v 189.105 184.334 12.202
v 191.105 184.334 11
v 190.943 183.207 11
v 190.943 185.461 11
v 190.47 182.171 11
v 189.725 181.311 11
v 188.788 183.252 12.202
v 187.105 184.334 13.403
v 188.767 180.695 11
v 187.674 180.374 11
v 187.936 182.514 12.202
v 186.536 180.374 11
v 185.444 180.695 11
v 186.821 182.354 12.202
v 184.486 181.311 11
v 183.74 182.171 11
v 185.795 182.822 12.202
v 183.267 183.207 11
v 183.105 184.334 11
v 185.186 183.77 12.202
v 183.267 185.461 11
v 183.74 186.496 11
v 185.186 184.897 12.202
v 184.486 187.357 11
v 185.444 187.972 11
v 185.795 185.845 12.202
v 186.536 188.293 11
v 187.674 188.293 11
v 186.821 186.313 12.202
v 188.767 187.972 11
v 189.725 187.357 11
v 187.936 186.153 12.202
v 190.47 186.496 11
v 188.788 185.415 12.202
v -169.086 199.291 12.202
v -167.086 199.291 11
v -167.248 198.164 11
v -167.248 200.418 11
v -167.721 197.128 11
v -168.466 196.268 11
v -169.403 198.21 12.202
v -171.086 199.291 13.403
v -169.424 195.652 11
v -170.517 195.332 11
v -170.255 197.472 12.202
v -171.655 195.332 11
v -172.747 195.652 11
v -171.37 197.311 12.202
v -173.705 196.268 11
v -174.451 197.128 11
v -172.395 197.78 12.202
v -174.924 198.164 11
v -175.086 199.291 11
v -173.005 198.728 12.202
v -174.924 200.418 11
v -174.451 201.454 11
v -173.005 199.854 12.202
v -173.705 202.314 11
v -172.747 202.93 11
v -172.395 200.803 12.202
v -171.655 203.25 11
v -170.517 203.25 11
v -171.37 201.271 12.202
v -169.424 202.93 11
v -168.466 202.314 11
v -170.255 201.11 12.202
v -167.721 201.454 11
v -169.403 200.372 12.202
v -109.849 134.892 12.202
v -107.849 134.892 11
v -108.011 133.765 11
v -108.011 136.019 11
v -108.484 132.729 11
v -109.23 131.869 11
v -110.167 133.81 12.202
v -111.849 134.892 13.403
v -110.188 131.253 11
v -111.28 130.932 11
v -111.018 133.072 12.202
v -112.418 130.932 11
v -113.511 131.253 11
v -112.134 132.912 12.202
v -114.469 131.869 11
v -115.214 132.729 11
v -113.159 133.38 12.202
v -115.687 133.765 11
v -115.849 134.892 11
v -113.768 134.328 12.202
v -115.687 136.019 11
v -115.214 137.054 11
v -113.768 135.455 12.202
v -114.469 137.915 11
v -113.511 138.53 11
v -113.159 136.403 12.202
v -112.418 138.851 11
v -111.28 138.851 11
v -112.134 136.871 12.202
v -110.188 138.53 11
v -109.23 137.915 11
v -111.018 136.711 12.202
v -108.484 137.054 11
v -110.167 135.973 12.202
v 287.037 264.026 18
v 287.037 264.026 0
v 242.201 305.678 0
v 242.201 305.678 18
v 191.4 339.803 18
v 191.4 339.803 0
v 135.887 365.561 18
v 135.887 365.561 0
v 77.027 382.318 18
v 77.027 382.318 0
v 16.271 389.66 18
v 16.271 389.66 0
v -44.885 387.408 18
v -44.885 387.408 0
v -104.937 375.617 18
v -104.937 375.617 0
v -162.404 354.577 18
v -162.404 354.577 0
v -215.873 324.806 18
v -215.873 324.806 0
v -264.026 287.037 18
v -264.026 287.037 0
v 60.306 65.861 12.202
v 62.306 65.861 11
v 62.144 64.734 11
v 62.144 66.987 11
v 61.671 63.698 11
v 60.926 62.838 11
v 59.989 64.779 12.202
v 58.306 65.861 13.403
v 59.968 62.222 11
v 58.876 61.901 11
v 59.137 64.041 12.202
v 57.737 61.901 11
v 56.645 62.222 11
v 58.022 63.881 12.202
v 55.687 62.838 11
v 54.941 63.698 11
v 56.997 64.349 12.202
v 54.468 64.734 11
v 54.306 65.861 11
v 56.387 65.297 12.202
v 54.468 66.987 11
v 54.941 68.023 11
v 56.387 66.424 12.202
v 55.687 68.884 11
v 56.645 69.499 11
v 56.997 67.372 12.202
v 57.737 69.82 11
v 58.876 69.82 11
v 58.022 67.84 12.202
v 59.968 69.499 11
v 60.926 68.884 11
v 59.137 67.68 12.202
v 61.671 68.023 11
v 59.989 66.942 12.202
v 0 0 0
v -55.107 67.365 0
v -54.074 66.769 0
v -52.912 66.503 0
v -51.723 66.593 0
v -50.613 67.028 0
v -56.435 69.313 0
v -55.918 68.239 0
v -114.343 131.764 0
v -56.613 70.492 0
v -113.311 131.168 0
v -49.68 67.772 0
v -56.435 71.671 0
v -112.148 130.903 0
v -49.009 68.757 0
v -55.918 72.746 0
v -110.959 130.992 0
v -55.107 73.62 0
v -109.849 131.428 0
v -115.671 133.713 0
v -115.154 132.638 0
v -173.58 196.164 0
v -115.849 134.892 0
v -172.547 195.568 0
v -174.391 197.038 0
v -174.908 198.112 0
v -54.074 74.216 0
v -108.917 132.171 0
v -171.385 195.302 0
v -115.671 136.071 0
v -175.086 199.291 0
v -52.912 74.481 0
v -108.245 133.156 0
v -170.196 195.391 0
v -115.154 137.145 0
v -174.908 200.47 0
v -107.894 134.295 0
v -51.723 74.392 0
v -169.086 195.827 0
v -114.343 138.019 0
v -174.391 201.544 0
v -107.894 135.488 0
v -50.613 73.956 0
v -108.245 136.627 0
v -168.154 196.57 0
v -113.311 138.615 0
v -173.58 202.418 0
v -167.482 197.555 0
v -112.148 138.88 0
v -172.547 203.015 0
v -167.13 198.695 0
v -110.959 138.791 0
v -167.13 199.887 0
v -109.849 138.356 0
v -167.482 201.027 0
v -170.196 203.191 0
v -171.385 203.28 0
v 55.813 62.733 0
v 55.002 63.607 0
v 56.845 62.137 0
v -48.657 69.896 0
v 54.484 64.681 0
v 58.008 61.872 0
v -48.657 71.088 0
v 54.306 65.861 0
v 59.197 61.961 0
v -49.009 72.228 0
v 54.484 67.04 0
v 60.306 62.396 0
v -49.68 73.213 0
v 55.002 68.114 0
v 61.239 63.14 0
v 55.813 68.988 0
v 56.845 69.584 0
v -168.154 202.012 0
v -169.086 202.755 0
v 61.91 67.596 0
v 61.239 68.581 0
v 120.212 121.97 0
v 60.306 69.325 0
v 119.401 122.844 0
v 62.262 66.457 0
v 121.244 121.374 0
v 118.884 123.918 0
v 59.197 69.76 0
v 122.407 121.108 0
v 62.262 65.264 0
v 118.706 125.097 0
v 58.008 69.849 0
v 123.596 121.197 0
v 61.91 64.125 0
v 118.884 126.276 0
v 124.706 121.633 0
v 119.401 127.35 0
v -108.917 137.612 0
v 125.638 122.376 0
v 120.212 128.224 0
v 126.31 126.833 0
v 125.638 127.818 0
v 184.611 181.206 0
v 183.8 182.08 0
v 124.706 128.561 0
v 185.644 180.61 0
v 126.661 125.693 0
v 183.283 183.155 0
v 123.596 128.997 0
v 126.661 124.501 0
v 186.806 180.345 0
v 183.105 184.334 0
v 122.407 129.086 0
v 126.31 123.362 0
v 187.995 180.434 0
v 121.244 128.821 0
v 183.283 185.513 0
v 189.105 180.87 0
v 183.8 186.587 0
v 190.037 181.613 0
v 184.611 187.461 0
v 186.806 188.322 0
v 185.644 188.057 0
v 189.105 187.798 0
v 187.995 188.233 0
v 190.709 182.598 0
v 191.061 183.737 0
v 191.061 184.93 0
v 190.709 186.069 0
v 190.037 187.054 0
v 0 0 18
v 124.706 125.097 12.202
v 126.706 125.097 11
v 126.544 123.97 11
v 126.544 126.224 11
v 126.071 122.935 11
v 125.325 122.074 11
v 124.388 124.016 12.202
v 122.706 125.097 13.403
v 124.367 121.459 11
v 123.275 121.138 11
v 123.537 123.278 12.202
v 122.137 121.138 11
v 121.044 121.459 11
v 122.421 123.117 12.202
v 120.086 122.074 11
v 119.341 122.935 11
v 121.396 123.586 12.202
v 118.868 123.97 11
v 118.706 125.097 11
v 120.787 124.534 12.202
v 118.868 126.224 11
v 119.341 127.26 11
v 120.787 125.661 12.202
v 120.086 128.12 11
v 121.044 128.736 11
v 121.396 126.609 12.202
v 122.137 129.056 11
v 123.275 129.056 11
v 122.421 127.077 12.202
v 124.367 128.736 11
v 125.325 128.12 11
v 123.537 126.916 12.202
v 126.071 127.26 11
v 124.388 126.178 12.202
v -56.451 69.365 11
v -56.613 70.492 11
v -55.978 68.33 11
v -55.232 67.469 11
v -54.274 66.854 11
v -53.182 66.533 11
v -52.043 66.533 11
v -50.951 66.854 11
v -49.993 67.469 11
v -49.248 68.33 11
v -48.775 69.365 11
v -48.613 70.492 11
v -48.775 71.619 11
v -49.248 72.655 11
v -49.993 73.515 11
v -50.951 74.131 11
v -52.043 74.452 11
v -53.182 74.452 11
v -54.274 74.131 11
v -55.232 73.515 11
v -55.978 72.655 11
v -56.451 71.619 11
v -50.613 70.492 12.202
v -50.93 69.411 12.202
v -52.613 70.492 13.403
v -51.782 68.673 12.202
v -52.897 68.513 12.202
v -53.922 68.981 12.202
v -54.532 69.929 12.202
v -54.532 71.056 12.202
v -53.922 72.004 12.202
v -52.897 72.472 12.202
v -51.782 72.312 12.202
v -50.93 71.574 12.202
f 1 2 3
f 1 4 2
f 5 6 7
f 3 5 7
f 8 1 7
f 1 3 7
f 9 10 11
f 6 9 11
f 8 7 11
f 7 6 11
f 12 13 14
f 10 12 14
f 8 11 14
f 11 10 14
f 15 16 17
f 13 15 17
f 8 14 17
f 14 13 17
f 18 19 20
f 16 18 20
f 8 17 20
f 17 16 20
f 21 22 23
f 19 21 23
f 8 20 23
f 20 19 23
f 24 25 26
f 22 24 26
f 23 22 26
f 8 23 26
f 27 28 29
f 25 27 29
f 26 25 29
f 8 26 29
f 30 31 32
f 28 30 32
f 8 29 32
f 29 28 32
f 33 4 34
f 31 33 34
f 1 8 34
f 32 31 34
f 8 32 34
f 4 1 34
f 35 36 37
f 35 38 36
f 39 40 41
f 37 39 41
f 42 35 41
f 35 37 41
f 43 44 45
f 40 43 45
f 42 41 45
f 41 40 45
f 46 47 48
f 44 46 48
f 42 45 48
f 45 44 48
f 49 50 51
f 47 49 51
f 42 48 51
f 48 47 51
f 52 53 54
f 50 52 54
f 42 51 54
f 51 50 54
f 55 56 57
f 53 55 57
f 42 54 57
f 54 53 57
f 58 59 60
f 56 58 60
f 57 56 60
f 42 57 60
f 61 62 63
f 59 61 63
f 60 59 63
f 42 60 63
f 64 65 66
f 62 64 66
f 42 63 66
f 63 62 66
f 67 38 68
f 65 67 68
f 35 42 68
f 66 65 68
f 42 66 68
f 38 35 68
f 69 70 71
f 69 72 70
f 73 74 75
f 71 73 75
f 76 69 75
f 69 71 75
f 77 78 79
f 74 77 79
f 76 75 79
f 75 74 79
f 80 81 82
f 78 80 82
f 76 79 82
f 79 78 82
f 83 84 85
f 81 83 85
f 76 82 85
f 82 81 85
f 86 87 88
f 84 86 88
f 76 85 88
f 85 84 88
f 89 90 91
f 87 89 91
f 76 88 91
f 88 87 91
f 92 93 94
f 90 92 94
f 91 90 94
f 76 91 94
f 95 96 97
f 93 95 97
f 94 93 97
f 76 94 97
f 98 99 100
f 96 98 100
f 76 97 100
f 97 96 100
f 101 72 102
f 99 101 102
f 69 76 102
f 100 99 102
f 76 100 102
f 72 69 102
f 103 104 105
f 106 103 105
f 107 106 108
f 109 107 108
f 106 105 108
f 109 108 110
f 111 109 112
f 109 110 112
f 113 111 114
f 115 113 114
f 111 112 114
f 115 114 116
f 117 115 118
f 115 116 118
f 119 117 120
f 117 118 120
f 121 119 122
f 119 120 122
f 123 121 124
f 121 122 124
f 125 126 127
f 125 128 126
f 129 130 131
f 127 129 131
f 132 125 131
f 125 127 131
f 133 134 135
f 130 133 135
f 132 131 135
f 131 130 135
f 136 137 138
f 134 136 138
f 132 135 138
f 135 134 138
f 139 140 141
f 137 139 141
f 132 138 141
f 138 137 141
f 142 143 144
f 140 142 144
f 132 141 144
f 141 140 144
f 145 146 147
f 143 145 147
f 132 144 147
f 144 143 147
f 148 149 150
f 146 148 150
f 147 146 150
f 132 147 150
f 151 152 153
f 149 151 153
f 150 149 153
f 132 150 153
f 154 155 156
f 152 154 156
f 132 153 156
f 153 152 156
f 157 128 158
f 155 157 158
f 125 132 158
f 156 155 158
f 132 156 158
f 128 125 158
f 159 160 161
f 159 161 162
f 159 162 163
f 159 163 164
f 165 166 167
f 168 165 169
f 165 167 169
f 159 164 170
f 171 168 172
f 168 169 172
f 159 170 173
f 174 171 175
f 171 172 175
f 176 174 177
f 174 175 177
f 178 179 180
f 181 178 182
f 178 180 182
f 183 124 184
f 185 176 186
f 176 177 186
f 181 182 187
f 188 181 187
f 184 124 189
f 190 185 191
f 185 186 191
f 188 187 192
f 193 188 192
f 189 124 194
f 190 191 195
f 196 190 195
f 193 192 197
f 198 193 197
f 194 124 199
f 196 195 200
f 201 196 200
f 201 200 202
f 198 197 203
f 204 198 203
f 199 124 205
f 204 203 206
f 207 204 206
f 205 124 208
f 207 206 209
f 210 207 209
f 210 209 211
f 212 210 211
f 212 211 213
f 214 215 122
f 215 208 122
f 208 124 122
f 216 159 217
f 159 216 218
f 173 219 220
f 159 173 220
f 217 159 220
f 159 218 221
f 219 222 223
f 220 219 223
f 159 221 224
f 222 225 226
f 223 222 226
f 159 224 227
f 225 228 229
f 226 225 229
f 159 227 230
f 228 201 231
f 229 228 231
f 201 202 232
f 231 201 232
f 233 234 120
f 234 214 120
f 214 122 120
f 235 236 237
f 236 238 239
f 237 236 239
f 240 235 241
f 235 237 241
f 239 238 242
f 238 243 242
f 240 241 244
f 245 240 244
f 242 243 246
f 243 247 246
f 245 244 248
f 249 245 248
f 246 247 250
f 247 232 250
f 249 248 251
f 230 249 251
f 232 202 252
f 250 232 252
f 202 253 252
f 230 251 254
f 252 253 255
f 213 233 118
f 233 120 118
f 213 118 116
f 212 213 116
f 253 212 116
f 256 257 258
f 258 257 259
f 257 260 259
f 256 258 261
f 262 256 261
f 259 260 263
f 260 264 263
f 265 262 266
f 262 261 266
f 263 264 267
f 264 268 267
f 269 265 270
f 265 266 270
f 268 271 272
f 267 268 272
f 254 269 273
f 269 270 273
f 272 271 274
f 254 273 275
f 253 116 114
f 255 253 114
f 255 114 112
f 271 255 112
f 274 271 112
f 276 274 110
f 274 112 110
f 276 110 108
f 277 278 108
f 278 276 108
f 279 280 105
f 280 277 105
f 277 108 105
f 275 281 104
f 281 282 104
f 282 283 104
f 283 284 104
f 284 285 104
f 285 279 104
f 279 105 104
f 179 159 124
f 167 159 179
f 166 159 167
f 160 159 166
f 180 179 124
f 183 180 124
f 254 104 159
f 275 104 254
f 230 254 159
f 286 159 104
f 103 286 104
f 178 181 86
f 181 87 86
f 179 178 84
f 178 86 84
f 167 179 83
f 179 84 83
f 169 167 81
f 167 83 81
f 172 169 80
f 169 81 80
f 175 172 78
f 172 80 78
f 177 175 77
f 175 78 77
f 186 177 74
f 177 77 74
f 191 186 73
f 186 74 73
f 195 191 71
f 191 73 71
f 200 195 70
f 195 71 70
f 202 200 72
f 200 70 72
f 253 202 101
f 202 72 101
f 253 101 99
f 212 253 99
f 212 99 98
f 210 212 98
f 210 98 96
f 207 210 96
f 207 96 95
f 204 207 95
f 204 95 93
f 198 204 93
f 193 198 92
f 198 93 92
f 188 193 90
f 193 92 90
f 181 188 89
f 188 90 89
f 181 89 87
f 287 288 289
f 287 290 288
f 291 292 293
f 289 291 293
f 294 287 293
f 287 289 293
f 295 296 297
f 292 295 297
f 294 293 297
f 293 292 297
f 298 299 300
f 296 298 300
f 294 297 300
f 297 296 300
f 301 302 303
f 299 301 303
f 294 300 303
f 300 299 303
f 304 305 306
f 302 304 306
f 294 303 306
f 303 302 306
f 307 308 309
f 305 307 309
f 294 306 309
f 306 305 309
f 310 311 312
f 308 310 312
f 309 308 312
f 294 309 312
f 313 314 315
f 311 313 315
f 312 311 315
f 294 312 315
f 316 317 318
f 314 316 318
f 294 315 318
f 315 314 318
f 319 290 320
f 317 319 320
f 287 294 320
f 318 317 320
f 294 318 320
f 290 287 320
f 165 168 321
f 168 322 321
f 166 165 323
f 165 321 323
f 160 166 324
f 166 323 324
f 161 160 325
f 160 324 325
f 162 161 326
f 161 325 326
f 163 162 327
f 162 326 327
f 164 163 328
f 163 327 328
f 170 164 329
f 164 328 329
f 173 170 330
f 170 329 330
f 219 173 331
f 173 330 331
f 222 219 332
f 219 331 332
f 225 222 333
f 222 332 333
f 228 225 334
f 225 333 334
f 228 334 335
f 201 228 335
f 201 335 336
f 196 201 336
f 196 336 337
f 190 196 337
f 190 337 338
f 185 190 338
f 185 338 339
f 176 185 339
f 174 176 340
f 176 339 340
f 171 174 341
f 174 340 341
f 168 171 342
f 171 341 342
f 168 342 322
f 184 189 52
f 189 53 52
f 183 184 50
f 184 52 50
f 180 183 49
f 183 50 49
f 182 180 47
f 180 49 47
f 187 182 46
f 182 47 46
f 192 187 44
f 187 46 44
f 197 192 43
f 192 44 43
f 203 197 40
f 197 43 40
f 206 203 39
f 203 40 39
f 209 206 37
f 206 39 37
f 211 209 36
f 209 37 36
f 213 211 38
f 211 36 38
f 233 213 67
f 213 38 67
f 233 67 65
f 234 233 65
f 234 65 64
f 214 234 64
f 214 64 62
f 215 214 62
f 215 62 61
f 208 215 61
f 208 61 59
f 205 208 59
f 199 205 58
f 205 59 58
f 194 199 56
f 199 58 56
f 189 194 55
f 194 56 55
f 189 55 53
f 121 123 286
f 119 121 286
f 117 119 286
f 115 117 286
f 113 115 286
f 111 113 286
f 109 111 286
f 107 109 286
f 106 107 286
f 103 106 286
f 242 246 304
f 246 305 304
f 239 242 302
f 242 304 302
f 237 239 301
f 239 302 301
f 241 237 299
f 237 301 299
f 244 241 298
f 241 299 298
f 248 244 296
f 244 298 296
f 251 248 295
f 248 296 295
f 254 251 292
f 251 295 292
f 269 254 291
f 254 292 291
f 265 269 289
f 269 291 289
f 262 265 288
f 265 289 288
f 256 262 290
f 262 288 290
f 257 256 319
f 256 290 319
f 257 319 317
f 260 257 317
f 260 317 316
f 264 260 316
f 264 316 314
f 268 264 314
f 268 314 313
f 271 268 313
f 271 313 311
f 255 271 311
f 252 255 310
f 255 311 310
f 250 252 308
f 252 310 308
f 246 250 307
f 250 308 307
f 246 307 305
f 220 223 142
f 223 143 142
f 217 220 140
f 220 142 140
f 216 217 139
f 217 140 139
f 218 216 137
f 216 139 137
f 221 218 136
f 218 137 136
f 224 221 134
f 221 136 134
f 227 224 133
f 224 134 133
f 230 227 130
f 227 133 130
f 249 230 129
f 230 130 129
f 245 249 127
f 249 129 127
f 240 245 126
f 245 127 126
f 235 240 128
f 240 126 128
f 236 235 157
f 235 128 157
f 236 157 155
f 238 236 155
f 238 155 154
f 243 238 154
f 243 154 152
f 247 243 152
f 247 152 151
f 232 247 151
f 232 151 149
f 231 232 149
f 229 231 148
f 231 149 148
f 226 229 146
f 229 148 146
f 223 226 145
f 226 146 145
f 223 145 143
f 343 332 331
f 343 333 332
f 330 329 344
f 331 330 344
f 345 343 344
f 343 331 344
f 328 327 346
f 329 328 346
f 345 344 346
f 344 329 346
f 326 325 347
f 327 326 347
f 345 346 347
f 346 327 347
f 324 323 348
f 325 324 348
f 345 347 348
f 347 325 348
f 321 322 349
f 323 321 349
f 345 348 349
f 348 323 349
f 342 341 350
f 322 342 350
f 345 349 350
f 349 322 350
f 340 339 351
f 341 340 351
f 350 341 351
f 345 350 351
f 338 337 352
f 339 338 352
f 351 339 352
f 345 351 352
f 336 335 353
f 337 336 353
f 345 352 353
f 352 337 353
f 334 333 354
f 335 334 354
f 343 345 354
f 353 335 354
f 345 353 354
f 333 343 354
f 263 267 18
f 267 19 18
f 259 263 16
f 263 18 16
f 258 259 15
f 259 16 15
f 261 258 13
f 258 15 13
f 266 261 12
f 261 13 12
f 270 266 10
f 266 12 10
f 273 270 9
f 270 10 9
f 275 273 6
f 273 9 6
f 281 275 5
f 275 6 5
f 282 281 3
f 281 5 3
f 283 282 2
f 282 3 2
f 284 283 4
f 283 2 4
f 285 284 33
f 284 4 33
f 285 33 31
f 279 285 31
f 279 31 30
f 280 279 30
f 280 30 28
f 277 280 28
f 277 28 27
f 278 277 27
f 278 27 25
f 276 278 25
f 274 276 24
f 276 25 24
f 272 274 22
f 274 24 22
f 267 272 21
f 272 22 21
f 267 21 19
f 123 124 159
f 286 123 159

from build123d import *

# Parameters (mm, degrees)
F1_DEPTH = 18
F3_D     = 8
F3_DEPTH = 11
F3_TIP   = 2.4034424761


# Not quite as in the source:
# - a feature names something its author has since deleted; it is built from what else it names


with BuildPart() as f1:
    # F0 (on Top) → F1 (new body)
    with BuildSketch(Plane.XY):
        with BuildLine():
            ThreePointArc((287.0371856283, 264.0258587081), (16.2714653094, 389.6604155116), (-264.0258587081, 287.0371856283))
            Line((-264.0258587081, 287.0371856283), (0, 0))
            Line((0, 0), (287.0371856283, 264.0258587081))
        make_face()
    extrude(amount=F1_DEPTH)

    # F3
    with Locations(Plane(origin=(0, 0, 0), x_dir=(1, 0, 0), z_dir=(0, 0, -1))):
        with Locations((-111.8492066751, -134.8916415726), (-52.612635811, -70.4922730022), (58.3064641387, -65.860505917), (122.7058327092, -125.097076781), (187.1052012796, -184.333647645), (-171.0857775391, -199.2910101431)):
            Hole(F3_D / 2, depth=F3_DEPTH)
            with Locations((0, 0, -(F3_DEPTH + F3_TIP / 2))):  # 118° drill point
                Cone(0, F3_D / 2, F3_TIP, mode=Mode.SUBTRACT)


solid = f1.part
